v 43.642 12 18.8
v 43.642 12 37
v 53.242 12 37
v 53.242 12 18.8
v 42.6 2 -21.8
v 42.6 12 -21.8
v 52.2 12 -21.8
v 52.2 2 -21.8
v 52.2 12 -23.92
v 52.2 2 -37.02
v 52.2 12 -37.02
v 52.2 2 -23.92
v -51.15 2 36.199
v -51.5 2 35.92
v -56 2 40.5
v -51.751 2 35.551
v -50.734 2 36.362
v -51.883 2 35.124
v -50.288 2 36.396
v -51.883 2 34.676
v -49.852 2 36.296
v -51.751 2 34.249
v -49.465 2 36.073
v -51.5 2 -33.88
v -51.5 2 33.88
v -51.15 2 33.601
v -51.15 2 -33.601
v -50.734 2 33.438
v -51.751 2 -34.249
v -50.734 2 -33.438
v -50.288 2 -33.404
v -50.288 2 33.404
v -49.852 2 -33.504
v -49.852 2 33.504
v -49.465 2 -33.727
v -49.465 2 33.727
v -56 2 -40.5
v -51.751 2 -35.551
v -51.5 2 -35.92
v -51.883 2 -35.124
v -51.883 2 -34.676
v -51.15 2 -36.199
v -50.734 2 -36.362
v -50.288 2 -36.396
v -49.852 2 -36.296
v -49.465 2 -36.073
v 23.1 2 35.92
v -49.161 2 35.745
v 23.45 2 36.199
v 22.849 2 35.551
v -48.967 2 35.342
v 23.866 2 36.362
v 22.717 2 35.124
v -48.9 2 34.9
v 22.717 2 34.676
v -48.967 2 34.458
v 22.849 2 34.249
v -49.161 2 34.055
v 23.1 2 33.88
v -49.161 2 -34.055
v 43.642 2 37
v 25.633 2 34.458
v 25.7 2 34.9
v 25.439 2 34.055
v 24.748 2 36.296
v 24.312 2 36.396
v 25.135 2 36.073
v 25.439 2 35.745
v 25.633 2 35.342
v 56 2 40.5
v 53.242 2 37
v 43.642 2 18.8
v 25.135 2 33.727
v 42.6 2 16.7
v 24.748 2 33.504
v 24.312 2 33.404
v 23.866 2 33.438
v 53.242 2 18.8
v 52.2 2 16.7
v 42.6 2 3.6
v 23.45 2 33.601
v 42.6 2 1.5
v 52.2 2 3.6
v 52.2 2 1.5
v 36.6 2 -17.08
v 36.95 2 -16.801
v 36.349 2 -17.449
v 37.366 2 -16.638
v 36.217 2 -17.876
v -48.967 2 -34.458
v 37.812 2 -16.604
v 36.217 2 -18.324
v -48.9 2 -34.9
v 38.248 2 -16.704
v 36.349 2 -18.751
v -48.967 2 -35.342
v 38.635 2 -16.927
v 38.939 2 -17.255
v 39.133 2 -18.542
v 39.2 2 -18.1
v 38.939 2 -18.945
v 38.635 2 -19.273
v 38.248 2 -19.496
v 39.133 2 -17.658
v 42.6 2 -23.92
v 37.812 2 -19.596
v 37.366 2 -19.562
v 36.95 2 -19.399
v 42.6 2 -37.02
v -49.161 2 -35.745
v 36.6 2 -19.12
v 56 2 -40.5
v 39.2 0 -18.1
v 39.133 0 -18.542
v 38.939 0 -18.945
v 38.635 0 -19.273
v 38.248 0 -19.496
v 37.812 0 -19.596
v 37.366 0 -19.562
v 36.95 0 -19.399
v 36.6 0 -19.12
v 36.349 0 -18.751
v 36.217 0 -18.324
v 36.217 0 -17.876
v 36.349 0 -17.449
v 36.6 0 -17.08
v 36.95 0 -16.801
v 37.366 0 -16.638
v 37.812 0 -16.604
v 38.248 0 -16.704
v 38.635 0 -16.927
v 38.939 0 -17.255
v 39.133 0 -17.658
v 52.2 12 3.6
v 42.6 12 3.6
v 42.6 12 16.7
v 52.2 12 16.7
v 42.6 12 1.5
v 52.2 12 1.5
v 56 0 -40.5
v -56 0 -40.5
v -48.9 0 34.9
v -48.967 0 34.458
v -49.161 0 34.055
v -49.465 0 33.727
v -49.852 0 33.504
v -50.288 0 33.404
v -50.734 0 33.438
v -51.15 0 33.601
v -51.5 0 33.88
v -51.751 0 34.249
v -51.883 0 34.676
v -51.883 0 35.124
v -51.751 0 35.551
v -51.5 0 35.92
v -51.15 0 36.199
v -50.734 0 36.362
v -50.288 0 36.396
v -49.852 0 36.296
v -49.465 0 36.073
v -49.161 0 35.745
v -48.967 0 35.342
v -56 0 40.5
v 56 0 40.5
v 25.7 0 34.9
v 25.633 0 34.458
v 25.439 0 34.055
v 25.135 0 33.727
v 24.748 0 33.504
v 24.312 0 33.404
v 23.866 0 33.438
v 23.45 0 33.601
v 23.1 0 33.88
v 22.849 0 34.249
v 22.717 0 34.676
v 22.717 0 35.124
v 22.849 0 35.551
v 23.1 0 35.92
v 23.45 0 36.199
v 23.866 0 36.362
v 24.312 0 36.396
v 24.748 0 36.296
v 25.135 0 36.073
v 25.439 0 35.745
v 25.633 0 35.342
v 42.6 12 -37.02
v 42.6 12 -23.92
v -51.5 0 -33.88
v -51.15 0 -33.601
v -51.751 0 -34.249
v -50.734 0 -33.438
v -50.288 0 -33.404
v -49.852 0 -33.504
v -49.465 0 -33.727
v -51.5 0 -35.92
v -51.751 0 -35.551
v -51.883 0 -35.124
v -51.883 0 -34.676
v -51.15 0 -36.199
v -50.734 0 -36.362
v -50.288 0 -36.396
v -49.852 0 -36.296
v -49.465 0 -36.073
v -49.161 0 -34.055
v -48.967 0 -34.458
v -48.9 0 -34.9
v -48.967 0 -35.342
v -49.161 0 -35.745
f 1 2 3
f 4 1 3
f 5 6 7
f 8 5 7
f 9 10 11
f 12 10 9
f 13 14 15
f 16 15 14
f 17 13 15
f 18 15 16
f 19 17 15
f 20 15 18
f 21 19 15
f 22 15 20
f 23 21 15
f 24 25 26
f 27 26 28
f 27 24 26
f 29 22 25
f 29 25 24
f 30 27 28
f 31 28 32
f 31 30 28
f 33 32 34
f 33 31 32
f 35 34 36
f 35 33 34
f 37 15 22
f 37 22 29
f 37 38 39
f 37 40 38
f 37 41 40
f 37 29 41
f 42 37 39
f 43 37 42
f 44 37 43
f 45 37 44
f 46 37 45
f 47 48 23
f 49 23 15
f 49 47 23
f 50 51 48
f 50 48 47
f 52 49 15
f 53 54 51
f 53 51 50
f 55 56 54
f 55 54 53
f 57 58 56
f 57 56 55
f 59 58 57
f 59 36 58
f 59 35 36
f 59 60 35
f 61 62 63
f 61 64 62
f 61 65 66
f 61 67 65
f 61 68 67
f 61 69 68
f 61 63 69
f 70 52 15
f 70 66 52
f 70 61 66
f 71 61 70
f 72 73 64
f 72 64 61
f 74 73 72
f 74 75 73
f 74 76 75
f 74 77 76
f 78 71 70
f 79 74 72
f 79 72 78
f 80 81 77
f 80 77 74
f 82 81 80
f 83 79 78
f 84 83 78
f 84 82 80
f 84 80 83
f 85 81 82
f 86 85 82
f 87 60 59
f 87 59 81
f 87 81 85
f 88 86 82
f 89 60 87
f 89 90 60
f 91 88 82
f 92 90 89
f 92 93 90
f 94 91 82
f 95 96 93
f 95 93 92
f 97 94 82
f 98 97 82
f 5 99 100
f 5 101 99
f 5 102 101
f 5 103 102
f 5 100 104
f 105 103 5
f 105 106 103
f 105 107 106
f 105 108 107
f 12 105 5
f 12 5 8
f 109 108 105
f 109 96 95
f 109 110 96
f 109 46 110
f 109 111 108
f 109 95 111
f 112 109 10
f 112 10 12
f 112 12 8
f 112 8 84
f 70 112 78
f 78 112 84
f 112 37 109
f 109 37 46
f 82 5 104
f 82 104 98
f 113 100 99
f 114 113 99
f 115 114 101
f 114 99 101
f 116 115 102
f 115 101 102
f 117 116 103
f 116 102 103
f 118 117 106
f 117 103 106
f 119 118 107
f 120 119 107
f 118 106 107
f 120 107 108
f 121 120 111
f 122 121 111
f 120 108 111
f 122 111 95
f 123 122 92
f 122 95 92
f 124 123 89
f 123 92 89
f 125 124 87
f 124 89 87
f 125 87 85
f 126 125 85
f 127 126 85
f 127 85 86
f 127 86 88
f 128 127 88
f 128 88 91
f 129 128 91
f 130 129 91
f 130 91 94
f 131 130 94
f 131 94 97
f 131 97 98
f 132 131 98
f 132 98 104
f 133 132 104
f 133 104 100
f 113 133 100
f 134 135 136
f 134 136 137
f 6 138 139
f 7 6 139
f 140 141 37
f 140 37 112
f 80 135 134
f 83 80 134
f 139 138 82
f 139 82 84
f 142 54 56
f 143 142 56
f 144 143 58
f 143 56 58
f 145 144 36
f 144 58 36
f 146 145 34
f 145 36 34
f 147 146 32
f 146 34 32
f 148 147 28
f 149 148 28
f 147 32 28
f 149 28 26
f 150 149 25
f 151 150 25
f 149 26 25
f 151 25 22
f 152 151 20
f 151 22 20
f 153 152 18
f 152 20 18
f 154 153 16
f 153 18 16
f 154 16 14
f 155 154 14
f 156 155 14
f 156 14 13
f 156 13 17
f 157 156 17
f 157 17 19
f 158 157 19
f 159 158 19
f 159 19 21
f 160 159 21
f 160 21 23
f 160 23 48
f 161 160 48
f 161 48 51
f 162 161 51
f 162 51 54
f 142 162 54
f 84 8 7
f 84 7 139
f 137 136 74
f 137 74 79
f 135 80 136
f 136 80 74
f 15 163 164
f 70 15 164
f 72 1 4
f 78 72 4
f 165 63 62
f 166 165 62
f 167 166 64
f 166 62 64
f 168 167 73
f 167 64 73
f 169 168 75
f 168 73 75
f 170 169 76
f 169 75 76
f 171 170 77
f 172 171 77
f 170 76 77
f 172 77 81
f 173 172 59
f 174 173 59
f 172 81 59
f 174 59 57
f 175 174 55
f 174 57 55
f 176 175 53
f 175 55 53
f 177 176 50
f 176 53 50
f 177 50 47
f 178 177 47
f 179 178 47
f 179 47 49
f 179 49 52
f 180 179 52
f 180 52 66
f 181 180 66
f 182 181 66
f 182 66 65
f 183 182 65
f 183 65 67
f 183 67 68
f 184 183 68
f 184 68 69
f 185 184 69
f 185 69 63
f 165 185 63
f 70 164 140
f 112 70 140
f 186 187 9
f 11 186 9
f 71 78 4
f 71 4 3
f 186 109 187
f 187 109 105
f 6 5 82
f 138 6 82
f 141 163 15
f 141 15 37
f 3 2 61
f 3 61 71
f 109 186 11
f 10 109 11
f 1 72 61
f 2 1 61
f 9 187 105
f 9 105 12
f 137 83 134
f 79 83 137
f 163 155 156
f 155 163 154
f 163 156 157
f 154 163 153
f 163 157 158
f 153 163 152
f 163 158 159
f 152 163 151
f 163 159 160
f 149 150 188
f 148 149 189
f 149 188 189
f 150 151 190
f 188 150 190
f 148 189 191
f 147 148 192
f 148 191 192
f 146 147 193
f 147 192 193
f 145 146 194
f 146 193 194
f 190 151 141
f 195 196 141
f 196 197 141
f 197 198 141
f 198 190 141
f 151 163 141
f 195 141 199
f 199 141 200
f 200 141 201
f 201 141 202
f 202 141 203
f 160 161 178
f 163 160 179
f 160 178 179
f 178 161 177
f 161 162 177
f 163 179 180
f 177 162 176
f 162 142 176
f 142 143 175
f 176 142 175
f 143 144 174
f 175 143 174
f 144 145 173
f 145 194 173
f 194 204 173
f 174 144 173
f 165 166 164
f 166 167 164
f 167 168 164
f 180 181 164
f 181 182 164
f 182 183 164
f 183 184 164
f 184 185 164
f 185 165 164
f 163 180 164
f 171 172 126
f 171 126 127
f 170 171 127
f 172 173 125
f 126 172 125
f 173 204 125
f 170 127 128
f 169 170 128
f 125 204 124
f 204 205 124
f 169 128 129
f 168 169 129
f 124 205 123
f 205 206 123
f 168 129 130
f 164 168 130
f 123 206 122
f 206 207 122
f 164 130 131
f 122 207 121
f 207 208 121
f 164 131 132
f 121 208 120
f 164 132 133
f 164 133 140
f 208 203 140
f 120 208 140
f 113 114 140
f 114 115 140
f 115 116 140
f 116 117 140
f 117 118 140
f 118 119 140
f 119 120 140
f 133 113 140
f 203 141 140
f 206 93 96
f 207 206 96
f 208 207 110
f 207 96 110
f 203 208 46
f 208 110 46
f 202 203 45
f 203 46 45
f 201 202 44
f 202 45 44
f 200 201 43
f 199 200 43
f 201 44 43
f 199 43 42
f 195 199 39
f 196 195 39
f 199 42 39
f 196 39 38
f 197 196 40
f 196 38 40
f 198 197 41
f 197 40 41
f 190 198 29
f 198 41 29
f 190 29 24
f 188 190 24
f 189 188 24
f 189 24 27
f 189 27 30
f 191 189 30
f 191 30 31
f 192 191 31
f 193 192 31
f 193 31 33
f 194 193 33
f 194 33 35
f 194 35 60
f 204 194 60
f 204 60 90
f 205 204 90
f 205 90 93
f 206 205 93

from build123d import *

# Parameters (mm, degrees)
ESQUISSE1_W             = 112
ESQUISSE1_H             = 81
BOSS_EXTRU_1_DEPTH      = 2
ESQUISSE2_R             = 1.5
ENL_V_MAT_EXTRU_1_DEPTH = 10
ESQUISSE3_W             = 9.6
ESQUISSE3_H             = 13.1
ESQUISSE3_H_2           = 23.3
ESQUISSE3_H_3           = 18.2
BOSS_EXTRU_2_DEPTH      = 10


with BuildPart() as part:
    # Esquisse1 → Boss.-Extru.1 (new body)
    with BuildSketch(Plane(origin=(0, 0, 0), x_dir=(1, 0, 0), z_dir=(0, 1, 0))):
        Rectangle(ESQUISSE1_W, ESQUISSE1_H)
    extrude(amount=BOSS_EXTRU_1_DEPTH)

    # Esquisse2 → Enlèv. mat.-Extru.1 (cut)
    with BuildSketch(Plane(origin=(0, 2, 0), x_dir=(1, 0, 0), z_dir=(0, 1, 0))):
        with Locations((-50.4, 34.9)):
            Circle(ESQUISSE2_R)
        with Locations((-50.4, -34.9)):
            Circle(ESQUISSE2_R)
        with Locations((24.2, -34.9)):
            Circle(ESQUISSE2_R)
        with Locations((37.7, 18.1)):
            Circle(ESQUISSE2_R)
    extrude(amount=-ENL_V_MAT_EXTRU_1_DEPTH, mode=Mode.SUBTRACT)

    # Esquisse3 → Boss.-Extru.2 (add)
    with BuildSketch(Plane(origin=(0, 2, -2), x_dir=(1, 0, 0), z_dir=(0, -1, 0))):
        with Locations((47.4, 12.15)):
            Rectangle(ESQUISSE3_W, ESQUISSE3_H)
        with Locations((47.4, -8.15)):
            Rectangle(ESQUISSE3_W, ESQUISSE3_H_2)
        with Locations((47.4, -28.47)):
            Rectangle(ESQUISSE3_W, ESQUISSE3_H)
        with Locations((48.442, 29.9)):
            Rectangle(ESQUISSE3_W, ESQUISSE3_H_3)
    extrude(amount=-BOSS_EXTRU_2_DEPTH)


solid = part.part
